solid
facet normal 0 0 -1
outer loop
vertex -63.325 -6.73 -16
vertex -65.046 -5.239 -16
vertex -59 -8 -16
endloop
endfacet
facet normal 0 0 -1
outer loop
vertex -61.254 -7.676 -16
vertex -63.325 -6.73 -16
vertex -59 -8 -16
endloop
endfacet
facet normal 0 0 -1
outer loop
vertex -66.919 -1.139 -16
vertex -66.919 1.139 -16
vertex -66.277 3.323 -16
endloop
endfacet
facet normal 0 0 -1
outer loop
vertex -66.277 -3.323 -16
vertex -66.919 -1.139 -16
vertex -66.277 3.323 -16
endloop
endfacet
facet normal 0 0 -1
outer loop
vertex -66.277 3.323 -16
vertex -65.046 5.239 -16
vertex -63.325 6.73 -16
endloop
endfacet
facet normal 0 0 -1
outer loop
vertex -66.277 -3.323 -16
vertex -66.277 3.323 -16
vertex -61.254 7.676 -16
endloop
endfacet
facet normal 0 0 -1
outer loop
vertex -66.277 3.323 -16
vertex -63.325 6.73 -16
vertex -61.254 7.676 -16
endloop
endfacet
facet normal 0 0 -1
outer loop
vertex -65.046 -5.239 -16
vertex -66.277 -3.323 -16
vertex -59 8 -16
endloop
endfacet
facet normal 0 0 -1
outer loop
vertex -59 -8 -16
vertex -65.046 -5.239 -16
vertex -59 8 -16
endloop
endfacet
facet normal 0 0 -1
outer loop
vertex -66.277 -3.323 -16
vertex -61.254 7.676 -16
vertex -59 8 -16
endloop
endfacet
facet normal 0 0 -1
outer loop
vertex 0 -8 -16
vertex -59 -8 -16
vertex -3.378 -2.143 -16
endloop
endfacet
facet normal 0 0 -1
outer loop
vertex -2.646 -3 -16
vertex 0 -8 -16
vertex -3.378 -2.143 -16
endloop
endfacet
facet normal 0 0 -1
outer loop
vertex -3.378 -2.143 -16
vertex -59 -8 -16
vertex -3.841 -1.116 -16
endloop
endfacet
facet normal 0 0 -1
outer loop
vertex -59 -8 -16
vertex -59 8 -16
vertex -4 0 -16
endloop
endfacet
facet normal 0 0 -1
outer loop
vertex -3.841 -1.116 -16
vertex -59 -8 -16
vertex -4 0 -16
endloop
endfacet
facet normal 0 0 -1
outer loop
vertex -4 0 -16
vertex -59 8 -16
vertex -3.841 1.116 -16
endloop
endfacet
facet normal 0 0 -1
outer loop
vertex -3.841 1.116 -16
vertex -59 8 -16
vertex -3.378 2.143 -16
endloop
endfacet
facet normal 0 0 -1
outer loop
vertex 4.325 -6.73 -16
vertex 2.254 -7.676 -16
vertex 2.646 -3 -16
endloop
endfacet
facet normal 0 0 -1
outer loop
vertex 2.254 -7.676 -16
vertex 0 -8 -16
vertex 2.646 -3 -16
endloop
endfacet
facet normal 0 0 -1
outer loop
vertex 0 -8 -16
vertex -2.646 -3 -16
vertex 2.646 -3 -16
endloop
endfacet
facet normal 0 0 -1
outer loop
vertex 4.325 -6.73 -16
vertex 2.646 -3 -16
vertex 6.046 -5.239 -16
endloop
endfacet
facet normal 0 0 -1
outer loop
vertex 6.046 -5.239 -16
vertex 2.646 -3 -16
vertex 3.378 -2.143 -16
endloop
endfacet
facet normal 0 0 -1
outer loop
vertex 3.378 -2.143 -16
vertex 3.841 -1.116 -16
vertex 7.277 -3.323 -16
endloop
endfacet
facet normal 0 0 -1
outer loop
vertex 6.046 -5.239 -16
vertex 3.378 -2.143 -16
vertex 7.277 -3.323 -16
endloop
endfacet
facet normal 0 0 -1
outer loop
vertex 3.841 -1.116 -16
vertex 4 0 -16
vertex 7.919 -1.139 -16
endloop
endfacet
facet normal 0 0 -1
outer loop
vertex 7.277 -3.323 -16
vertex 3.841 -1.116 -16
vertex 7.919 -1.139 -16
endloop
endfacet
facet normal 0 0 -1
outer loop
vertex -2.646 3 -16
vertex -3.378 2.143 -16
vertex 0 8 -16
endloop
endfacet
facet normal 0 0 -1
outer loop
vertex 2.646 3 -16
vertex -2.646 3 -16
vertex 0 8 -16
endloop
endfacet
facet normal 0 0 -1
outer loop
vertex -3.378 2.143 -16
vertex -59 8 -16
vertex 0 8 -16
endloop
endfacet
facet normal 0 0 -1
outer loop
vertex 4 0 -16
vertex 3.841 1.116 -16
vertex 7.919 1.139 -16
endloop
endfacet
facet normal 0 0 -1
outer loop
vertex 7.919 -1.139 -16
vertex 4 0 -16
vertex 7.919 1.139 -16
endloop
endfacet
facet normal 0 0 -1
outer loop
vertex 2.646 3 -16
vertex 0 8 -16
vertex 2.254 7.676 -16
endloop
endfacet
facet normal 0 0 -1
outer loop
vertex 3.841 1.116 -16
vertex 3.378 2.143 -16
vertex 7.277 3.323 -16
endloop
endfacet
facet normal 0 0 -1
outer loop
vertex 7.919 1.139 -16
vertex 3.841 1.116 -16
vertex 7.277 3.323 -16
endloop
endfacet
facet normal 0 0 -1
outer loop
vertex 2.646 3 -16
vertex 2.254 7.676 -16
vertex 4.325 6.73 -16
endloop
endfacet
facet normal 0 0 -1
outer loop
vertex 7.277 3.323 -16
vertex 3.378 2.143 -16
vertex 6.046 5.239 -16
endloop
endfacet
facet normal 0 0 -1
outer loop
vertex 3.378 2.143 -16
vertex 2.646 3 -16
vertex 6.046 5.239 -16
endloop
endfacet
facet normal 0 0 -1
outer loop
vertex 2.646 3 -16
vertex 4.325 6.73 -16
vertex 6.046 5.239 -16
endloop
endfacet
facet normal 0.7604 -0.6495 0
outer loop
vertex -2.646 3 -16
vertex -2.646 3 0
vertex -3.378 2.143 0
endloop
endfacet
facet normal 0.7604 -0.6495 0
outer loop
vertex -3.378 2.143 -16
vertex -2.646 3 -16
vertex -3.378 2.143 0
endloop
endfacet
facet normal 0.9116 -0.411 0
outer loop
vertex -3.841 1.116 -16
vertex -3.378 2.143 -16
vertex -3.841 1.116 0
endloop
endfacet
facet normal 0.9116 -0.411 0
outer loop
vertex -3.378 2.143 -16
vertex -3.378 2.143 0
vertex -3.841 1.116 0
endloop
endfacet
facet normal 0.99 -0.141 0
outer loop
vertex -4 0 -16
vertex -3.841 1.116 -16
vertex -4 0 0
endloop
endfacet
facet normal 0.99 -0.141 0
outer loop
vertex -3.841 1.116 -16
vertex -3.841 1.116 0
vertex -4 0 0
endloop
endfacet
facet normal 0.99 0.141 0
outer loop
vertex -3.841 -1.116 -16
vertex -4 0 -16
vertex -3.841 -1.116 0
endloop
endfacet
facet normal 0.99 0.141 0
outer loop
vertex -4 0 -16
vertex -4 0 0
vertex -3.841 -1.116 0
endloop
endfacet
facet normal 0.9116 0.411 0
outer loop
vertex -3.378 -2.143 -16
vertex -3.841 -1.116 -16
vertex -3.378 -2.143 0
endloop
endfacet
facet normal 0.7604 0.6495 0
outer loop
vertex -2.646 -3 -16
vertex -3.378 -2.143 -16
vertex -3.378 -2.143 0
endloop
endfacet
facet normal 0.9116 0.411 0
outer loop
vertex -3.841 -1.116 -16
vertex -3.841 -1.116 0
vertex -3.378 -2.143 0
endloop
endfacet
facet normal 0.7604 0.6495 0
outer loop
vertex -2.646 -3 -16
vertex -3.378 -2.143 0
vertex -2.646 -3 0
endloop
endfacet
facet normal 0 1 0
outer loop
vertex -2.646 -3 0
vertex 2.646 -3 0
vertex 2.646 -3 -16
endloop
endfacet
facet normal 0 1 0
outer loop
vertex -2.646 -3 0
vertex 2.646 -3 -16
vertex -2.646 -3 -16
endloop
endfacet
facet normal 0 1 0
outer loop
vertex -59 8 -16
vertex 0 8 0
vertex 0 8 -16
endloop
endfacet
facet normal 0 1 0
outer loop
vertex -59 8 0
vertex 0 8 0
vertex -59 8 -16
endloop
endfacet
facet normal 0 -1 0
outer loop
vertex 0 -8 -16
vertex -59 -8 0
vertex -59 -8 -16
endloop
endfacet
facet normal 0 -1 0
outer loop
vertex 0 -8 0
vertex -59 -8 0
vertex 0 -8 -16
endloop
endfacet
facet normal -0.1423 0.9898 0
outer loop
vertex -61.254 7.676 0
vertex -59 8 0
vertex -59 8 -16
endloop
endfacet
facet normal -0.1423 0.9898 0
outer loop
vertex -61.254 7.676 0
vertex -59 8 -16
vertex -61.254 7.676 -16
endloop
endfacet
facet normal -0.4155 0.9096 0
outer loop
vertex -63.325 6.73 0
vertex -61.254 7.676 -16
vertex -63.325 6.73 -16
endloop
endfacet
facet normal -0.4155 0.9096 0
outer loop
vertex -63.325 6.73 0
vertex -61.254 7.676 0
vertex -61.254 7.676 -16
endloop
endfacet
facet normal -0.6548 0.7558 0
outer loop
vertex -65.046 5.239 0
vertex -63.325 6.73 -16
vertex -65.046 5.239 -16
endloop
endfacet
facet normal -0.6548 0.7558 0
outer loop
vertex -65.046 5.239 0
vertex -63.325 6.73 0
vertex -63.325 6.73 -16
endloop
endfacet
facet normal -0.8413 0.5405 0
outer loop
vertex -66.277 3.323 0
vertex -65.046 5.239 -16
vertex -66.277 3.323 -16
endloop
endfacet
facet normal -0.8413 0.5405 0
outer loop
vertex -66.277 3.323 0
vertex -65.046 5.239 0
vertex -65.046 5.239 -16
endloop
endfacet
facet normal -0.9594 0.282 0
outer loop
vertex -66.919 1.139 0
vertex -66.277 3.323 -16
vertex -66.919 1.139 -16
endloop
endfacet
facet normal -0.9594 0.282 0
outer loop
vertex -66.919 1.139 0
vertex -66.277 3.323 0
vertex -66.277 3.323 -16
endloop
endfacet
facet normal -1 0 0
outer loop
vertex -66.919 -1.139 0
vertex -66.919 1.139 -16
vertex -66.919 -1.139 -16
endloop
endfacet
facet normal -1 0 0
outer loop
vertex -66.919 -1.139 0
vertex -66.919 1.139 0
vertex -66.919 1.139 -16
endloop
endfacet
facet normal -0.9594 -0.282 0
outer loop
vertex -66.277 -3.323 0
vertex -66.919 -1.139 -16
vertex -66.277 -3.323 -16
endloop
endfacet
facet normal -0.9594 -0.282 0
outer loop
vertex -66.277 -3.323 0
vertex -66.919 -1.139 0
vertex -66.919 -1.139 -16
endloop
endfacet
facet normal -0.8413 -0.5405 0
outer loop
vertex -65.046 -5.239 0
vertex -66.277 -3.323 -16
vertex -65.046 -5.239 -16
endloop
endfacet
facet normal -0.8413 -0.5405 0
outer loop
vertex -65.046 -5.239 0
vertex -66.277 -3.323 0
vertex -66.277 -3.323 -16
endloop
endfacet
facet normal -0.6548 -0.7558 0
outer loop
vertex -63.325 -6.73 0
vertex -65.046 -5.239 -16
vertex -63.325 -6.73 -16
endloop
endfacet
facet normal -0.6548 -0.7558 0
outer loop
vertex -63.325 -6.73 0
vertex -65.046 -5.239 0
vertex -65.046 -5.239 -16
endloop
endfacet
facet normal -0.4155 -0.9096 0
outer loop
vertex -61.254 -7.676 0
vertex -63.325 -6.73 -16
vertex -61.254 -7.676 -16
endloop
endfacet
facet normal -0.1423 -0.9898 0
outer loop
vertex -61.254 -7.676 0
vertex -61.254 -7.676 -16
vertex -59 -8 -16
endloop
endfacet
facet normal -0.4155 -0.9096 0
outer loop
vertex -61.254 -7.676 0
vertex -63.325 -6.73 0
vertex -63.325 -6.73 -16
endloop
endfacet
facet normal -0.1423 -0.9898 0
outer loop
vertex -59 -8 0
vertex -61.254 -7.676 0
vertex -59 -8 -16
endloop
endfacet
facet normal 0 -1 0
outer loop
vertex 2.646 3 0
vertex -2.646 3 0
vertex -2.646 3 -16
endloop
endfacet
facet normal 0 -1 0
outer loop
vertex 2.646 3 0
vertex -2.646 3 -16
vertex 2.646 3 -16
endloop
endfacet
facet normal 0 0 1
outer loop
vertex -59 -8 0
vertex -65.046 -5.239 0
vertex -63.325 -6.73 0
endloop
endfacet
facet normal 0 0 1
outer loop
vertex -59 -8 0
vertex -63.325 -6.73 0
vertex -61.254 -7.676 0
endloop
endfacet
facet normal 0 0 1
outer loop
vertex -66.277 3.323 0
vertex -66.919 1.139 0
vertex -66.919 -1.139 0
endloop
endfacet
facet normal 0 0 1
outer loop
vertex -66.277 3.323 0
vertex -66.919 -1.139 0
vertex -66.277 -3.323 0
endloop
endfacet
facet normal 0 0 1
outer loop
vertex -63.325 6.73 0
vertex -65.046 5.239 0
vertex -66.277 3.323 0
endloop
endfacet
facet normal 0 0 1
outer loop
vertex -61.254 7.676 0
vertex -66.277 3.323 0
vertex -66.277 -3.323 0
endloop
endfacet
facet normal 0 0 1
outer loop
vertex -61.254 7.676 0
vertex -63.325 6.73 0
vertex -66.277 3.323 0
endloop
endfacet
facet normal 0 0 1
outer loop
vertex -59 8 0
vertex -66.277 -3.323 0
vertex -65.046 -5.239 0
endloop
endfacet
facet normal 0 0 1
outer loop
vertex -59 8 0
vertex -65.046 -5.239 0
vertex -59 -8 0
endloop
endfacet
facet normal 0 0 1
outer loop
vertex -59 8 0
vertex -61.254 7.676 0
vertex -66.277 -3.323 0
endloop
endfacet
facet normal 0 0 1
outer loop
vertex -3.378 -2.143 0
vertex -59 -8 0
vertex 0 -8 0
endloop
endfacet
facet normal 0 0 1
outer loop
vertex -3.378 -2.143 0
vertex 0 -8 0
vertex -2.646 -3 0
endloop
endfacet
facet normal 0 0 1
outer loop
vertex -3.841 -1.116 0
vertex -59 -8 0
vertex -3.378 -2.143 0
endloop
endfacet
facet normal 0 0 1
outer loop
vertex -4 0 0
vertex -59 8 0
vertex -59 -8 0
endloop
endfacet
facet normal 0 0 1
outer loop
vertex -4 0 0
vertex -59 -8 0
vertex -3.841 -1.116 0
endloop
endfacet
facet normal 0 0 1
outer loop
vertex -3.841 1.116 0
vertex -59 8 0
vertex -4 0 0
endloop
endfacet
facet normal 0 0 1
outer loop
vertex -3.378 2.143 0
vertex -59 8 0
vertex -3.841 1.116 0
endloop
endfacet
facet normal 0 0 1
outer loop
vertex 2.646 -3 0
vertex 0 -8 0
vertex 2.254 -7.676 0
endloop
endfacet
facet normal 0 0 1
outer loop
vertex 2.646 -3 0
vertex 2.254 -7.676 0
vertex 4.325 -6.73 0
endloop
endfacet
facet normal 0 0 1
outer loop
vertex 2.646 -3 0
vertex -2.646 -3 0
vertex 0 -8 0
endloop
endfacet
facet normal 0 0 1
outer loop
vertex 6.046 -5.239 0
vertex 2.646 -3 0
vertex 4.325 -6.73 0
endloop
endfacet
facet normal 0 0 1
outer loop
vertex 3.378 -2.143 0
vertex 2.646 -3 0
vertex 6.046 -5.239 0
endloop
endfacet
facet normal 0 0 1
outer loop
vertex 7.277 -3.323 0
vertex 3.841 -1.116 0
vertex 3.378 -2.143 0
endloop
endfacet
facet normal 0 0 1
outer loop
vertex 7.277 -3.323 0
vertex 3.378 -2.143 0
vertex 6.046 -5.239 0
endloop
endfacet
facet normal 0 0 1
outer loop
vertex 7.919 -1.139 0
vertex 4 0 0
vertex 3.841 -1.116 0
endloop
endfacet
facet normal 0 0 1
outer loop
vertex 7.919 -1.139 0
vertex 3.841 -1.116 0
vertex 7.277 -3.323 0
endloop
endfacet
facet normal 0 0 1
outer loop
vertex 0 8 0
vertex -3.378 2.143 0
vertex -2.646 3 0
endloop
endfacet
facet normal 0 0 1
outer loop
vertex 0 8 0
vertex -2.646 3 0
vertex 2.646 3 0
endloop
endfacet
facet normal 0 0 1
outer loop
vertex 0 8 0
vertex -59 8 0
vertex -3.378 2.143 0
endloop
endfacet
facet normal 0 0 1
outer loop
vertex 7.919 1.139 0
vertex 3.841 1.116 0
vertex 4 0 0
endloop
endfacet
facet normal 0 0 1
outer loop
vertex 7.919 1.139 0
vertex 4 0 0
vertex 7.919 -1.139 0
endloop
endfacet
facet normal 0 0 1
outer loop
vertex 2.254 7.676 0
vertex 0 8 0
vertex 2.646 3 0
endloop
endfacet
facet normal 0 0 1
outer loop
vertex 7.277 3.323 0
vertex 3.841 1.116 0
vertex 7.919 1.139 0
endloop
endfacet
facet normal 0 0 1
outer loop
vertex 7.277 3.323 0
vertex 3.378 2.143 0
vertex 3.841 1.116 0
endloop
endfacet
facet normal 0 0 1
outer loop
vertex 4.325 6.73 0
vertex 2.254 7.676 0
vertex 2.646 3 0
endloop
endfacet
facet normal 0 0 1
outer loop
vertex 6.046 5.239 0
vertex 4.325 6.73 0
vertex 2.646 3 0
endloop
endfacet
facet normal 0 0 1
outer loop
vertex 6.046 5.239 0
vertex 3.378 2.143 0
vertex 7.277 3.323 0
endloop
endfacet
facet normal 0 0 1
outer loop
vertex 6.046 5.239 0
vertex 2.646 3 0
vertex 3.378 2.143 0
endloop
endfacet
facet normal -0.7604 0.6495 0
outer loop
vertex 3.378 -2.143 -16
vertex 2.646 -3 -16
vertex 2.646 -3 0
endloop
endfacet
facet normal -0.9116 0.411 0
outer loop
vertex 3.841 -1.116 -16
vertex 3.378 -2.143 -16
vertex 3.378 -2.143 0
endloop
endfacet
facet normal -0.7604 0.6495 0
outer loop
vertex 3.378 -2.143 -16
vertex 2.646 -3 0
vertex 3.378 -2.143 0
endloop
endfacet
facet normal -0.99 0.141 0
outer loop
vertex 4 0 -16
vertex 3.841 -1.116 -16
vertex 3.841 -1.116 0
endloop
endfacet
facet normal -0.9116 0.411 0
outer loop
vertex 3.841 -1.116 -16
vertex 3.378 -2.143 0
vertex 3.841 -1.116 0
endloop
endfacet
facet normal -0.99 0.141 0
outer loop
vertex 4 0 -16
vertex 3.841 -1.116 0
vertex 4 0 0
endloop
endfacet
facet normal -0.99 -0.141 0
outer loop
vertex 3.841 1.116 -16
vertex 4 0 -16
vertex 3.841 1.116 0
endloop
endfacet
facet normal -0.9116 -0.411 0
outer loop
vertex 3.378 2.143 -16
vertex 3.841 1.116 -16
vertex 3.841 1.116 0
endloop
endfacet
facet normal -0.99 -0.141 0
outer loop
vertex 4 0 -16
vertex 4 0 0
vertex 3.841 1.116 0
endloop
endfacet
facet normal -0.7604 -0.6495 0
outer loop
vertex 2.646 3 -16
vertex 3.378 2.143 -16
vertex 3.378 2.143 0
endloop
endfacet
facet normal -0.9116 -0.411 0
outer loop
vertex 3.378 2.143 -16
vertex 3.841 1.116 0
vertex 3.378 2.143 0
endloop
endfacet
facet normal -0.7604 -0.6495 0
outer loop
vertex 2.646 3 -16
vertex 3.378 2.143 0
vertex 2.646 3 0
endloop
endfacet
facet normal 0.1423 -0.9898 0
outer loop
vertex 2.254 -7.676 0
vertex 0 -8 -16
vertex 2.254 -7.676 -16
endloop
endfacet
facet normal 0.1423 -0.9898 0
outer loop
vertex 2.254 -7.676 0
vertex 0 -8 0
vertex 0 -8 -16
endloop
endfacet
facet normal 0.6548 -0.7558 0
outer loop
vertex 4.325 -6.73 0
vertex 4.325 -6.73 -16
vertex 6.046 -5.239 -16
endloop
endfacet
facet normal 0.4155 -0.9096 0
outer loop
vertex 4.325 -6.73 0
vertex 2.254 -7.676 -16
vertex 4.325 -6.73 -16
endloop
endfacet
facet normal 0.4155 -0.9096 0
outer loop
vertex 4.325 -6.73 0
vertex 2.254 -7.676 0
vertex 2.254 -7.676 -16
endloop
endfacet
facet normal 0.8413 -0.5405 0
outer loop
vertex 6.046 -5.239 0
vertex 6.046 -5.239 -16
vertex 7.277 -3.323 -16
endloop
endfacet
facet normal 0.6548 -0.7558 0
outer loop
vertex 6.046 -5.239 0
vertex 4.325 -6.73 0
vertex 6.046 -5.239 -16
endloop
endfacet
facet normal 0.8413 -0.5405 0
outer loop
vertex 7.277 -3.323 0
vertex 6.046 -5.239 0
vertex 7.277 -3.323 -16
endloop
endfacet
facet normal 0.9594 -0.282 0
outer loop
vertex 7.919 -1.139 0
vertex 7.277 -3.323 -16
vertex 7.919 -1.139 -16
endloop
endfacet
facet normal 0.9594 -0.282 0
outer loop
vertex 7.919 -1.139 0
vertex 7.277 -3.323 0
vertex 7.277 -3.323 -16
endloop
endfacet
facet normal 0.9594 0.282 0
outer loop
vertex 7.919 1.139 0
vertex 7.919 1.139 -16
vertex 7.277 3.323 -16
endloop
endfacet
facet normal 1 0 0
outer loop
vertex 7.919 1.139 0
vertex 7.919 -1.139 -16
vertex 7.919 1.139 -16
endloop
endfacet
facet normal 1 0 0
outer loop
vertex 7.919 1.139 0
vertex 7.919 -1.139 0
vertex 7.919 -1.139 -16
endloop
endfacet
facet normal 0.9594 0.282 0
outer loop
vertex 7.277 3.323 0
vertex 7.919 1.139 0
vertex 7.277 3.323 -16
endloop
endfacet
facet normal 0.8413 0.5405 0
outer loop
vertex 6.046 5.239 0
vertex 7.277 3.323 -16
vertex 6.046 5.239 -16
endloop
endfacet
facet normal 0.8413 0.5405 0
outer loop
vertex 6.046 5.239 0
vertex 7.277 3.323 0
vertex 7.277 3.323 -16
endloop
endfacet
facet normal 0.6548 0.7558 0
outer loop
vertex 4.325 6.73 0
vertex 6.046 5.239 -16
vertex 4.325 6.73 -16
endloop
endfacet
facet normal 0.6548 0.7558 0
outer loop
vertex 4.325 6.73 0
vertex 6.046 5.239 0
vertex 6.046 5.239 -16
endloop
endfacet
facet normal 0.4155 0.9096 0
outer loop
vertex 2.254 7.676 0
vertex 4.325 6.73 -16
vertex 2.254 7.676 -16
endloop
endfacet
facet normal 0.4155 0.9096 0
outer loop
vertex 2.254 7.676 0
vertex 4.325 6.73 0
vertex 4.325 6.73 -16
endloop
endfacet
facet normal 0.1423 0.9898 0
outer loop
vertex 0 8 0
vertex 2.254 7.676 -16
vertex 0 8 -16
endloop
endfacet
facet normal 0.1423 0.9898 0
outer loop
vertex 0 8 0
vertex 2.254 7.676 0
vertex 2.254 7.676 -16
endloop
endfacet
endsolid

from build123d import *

# Parameters (mm, degrees)
SKETCH1_R           = 8
SKETCH1_R_2         = 4
BOSS_EXTRUDE1_DEPTH = 16


with BuildPart() as part:
    # Sketch1 → Boss-Extrude1 (new body)
    # profile 1 of 5: a face of its own
    with BuildSketch(Plane.XY):
        with Locations((-59, 0)):
            Circle(SKETCH1_R)
    # profile 2 of 5: a face of its own
    with BuildSketch(Plane.XY):
        with BuildLine():
            ThreePointArc((0, -8), (-8, 0), (0, 8))
            Line((0, 8), (-59, 8))
            ThreePointArc((-59, 8), (-53.343145751, 5.656854249), (-51, 0))
            ThreePointArc((-51, 0), (-53.343145751, -5.656854249), (-59, -8))
            Line((-59, -8), (0, -8))
        make_face()
    # profile 3 of 5: a face of its own
    with BuildSketch(Plane.XY):
        Circle(SKETCH1_R)
        Circle(SKETCH1_R_2, mode=Mode.SUBTRACT)
    # profile 4 of 5: a face of its own
    with BuildSketch(Plane.XY):
        with BuildLine():
            Line((-2.645751311, 3), (2.645751311, 3))
            ThreePointArc((2.645751311, 3), (0, 4), (-2.645751311, 3))
        make_face()
    # profile 5 of 5: a face of its own
    with BuildSketch(Plane.XY):
        with BuildLine():
            ThreePointArc((-2.645751311, -3), (0, -4), (2.645751311, -3))
            Line((2.645751311, -3), (-2.645751311, -3))
        make_face()
    extrude(amount=-BOSS_EXTRUDE1_DEPTH)


solid = part.part
